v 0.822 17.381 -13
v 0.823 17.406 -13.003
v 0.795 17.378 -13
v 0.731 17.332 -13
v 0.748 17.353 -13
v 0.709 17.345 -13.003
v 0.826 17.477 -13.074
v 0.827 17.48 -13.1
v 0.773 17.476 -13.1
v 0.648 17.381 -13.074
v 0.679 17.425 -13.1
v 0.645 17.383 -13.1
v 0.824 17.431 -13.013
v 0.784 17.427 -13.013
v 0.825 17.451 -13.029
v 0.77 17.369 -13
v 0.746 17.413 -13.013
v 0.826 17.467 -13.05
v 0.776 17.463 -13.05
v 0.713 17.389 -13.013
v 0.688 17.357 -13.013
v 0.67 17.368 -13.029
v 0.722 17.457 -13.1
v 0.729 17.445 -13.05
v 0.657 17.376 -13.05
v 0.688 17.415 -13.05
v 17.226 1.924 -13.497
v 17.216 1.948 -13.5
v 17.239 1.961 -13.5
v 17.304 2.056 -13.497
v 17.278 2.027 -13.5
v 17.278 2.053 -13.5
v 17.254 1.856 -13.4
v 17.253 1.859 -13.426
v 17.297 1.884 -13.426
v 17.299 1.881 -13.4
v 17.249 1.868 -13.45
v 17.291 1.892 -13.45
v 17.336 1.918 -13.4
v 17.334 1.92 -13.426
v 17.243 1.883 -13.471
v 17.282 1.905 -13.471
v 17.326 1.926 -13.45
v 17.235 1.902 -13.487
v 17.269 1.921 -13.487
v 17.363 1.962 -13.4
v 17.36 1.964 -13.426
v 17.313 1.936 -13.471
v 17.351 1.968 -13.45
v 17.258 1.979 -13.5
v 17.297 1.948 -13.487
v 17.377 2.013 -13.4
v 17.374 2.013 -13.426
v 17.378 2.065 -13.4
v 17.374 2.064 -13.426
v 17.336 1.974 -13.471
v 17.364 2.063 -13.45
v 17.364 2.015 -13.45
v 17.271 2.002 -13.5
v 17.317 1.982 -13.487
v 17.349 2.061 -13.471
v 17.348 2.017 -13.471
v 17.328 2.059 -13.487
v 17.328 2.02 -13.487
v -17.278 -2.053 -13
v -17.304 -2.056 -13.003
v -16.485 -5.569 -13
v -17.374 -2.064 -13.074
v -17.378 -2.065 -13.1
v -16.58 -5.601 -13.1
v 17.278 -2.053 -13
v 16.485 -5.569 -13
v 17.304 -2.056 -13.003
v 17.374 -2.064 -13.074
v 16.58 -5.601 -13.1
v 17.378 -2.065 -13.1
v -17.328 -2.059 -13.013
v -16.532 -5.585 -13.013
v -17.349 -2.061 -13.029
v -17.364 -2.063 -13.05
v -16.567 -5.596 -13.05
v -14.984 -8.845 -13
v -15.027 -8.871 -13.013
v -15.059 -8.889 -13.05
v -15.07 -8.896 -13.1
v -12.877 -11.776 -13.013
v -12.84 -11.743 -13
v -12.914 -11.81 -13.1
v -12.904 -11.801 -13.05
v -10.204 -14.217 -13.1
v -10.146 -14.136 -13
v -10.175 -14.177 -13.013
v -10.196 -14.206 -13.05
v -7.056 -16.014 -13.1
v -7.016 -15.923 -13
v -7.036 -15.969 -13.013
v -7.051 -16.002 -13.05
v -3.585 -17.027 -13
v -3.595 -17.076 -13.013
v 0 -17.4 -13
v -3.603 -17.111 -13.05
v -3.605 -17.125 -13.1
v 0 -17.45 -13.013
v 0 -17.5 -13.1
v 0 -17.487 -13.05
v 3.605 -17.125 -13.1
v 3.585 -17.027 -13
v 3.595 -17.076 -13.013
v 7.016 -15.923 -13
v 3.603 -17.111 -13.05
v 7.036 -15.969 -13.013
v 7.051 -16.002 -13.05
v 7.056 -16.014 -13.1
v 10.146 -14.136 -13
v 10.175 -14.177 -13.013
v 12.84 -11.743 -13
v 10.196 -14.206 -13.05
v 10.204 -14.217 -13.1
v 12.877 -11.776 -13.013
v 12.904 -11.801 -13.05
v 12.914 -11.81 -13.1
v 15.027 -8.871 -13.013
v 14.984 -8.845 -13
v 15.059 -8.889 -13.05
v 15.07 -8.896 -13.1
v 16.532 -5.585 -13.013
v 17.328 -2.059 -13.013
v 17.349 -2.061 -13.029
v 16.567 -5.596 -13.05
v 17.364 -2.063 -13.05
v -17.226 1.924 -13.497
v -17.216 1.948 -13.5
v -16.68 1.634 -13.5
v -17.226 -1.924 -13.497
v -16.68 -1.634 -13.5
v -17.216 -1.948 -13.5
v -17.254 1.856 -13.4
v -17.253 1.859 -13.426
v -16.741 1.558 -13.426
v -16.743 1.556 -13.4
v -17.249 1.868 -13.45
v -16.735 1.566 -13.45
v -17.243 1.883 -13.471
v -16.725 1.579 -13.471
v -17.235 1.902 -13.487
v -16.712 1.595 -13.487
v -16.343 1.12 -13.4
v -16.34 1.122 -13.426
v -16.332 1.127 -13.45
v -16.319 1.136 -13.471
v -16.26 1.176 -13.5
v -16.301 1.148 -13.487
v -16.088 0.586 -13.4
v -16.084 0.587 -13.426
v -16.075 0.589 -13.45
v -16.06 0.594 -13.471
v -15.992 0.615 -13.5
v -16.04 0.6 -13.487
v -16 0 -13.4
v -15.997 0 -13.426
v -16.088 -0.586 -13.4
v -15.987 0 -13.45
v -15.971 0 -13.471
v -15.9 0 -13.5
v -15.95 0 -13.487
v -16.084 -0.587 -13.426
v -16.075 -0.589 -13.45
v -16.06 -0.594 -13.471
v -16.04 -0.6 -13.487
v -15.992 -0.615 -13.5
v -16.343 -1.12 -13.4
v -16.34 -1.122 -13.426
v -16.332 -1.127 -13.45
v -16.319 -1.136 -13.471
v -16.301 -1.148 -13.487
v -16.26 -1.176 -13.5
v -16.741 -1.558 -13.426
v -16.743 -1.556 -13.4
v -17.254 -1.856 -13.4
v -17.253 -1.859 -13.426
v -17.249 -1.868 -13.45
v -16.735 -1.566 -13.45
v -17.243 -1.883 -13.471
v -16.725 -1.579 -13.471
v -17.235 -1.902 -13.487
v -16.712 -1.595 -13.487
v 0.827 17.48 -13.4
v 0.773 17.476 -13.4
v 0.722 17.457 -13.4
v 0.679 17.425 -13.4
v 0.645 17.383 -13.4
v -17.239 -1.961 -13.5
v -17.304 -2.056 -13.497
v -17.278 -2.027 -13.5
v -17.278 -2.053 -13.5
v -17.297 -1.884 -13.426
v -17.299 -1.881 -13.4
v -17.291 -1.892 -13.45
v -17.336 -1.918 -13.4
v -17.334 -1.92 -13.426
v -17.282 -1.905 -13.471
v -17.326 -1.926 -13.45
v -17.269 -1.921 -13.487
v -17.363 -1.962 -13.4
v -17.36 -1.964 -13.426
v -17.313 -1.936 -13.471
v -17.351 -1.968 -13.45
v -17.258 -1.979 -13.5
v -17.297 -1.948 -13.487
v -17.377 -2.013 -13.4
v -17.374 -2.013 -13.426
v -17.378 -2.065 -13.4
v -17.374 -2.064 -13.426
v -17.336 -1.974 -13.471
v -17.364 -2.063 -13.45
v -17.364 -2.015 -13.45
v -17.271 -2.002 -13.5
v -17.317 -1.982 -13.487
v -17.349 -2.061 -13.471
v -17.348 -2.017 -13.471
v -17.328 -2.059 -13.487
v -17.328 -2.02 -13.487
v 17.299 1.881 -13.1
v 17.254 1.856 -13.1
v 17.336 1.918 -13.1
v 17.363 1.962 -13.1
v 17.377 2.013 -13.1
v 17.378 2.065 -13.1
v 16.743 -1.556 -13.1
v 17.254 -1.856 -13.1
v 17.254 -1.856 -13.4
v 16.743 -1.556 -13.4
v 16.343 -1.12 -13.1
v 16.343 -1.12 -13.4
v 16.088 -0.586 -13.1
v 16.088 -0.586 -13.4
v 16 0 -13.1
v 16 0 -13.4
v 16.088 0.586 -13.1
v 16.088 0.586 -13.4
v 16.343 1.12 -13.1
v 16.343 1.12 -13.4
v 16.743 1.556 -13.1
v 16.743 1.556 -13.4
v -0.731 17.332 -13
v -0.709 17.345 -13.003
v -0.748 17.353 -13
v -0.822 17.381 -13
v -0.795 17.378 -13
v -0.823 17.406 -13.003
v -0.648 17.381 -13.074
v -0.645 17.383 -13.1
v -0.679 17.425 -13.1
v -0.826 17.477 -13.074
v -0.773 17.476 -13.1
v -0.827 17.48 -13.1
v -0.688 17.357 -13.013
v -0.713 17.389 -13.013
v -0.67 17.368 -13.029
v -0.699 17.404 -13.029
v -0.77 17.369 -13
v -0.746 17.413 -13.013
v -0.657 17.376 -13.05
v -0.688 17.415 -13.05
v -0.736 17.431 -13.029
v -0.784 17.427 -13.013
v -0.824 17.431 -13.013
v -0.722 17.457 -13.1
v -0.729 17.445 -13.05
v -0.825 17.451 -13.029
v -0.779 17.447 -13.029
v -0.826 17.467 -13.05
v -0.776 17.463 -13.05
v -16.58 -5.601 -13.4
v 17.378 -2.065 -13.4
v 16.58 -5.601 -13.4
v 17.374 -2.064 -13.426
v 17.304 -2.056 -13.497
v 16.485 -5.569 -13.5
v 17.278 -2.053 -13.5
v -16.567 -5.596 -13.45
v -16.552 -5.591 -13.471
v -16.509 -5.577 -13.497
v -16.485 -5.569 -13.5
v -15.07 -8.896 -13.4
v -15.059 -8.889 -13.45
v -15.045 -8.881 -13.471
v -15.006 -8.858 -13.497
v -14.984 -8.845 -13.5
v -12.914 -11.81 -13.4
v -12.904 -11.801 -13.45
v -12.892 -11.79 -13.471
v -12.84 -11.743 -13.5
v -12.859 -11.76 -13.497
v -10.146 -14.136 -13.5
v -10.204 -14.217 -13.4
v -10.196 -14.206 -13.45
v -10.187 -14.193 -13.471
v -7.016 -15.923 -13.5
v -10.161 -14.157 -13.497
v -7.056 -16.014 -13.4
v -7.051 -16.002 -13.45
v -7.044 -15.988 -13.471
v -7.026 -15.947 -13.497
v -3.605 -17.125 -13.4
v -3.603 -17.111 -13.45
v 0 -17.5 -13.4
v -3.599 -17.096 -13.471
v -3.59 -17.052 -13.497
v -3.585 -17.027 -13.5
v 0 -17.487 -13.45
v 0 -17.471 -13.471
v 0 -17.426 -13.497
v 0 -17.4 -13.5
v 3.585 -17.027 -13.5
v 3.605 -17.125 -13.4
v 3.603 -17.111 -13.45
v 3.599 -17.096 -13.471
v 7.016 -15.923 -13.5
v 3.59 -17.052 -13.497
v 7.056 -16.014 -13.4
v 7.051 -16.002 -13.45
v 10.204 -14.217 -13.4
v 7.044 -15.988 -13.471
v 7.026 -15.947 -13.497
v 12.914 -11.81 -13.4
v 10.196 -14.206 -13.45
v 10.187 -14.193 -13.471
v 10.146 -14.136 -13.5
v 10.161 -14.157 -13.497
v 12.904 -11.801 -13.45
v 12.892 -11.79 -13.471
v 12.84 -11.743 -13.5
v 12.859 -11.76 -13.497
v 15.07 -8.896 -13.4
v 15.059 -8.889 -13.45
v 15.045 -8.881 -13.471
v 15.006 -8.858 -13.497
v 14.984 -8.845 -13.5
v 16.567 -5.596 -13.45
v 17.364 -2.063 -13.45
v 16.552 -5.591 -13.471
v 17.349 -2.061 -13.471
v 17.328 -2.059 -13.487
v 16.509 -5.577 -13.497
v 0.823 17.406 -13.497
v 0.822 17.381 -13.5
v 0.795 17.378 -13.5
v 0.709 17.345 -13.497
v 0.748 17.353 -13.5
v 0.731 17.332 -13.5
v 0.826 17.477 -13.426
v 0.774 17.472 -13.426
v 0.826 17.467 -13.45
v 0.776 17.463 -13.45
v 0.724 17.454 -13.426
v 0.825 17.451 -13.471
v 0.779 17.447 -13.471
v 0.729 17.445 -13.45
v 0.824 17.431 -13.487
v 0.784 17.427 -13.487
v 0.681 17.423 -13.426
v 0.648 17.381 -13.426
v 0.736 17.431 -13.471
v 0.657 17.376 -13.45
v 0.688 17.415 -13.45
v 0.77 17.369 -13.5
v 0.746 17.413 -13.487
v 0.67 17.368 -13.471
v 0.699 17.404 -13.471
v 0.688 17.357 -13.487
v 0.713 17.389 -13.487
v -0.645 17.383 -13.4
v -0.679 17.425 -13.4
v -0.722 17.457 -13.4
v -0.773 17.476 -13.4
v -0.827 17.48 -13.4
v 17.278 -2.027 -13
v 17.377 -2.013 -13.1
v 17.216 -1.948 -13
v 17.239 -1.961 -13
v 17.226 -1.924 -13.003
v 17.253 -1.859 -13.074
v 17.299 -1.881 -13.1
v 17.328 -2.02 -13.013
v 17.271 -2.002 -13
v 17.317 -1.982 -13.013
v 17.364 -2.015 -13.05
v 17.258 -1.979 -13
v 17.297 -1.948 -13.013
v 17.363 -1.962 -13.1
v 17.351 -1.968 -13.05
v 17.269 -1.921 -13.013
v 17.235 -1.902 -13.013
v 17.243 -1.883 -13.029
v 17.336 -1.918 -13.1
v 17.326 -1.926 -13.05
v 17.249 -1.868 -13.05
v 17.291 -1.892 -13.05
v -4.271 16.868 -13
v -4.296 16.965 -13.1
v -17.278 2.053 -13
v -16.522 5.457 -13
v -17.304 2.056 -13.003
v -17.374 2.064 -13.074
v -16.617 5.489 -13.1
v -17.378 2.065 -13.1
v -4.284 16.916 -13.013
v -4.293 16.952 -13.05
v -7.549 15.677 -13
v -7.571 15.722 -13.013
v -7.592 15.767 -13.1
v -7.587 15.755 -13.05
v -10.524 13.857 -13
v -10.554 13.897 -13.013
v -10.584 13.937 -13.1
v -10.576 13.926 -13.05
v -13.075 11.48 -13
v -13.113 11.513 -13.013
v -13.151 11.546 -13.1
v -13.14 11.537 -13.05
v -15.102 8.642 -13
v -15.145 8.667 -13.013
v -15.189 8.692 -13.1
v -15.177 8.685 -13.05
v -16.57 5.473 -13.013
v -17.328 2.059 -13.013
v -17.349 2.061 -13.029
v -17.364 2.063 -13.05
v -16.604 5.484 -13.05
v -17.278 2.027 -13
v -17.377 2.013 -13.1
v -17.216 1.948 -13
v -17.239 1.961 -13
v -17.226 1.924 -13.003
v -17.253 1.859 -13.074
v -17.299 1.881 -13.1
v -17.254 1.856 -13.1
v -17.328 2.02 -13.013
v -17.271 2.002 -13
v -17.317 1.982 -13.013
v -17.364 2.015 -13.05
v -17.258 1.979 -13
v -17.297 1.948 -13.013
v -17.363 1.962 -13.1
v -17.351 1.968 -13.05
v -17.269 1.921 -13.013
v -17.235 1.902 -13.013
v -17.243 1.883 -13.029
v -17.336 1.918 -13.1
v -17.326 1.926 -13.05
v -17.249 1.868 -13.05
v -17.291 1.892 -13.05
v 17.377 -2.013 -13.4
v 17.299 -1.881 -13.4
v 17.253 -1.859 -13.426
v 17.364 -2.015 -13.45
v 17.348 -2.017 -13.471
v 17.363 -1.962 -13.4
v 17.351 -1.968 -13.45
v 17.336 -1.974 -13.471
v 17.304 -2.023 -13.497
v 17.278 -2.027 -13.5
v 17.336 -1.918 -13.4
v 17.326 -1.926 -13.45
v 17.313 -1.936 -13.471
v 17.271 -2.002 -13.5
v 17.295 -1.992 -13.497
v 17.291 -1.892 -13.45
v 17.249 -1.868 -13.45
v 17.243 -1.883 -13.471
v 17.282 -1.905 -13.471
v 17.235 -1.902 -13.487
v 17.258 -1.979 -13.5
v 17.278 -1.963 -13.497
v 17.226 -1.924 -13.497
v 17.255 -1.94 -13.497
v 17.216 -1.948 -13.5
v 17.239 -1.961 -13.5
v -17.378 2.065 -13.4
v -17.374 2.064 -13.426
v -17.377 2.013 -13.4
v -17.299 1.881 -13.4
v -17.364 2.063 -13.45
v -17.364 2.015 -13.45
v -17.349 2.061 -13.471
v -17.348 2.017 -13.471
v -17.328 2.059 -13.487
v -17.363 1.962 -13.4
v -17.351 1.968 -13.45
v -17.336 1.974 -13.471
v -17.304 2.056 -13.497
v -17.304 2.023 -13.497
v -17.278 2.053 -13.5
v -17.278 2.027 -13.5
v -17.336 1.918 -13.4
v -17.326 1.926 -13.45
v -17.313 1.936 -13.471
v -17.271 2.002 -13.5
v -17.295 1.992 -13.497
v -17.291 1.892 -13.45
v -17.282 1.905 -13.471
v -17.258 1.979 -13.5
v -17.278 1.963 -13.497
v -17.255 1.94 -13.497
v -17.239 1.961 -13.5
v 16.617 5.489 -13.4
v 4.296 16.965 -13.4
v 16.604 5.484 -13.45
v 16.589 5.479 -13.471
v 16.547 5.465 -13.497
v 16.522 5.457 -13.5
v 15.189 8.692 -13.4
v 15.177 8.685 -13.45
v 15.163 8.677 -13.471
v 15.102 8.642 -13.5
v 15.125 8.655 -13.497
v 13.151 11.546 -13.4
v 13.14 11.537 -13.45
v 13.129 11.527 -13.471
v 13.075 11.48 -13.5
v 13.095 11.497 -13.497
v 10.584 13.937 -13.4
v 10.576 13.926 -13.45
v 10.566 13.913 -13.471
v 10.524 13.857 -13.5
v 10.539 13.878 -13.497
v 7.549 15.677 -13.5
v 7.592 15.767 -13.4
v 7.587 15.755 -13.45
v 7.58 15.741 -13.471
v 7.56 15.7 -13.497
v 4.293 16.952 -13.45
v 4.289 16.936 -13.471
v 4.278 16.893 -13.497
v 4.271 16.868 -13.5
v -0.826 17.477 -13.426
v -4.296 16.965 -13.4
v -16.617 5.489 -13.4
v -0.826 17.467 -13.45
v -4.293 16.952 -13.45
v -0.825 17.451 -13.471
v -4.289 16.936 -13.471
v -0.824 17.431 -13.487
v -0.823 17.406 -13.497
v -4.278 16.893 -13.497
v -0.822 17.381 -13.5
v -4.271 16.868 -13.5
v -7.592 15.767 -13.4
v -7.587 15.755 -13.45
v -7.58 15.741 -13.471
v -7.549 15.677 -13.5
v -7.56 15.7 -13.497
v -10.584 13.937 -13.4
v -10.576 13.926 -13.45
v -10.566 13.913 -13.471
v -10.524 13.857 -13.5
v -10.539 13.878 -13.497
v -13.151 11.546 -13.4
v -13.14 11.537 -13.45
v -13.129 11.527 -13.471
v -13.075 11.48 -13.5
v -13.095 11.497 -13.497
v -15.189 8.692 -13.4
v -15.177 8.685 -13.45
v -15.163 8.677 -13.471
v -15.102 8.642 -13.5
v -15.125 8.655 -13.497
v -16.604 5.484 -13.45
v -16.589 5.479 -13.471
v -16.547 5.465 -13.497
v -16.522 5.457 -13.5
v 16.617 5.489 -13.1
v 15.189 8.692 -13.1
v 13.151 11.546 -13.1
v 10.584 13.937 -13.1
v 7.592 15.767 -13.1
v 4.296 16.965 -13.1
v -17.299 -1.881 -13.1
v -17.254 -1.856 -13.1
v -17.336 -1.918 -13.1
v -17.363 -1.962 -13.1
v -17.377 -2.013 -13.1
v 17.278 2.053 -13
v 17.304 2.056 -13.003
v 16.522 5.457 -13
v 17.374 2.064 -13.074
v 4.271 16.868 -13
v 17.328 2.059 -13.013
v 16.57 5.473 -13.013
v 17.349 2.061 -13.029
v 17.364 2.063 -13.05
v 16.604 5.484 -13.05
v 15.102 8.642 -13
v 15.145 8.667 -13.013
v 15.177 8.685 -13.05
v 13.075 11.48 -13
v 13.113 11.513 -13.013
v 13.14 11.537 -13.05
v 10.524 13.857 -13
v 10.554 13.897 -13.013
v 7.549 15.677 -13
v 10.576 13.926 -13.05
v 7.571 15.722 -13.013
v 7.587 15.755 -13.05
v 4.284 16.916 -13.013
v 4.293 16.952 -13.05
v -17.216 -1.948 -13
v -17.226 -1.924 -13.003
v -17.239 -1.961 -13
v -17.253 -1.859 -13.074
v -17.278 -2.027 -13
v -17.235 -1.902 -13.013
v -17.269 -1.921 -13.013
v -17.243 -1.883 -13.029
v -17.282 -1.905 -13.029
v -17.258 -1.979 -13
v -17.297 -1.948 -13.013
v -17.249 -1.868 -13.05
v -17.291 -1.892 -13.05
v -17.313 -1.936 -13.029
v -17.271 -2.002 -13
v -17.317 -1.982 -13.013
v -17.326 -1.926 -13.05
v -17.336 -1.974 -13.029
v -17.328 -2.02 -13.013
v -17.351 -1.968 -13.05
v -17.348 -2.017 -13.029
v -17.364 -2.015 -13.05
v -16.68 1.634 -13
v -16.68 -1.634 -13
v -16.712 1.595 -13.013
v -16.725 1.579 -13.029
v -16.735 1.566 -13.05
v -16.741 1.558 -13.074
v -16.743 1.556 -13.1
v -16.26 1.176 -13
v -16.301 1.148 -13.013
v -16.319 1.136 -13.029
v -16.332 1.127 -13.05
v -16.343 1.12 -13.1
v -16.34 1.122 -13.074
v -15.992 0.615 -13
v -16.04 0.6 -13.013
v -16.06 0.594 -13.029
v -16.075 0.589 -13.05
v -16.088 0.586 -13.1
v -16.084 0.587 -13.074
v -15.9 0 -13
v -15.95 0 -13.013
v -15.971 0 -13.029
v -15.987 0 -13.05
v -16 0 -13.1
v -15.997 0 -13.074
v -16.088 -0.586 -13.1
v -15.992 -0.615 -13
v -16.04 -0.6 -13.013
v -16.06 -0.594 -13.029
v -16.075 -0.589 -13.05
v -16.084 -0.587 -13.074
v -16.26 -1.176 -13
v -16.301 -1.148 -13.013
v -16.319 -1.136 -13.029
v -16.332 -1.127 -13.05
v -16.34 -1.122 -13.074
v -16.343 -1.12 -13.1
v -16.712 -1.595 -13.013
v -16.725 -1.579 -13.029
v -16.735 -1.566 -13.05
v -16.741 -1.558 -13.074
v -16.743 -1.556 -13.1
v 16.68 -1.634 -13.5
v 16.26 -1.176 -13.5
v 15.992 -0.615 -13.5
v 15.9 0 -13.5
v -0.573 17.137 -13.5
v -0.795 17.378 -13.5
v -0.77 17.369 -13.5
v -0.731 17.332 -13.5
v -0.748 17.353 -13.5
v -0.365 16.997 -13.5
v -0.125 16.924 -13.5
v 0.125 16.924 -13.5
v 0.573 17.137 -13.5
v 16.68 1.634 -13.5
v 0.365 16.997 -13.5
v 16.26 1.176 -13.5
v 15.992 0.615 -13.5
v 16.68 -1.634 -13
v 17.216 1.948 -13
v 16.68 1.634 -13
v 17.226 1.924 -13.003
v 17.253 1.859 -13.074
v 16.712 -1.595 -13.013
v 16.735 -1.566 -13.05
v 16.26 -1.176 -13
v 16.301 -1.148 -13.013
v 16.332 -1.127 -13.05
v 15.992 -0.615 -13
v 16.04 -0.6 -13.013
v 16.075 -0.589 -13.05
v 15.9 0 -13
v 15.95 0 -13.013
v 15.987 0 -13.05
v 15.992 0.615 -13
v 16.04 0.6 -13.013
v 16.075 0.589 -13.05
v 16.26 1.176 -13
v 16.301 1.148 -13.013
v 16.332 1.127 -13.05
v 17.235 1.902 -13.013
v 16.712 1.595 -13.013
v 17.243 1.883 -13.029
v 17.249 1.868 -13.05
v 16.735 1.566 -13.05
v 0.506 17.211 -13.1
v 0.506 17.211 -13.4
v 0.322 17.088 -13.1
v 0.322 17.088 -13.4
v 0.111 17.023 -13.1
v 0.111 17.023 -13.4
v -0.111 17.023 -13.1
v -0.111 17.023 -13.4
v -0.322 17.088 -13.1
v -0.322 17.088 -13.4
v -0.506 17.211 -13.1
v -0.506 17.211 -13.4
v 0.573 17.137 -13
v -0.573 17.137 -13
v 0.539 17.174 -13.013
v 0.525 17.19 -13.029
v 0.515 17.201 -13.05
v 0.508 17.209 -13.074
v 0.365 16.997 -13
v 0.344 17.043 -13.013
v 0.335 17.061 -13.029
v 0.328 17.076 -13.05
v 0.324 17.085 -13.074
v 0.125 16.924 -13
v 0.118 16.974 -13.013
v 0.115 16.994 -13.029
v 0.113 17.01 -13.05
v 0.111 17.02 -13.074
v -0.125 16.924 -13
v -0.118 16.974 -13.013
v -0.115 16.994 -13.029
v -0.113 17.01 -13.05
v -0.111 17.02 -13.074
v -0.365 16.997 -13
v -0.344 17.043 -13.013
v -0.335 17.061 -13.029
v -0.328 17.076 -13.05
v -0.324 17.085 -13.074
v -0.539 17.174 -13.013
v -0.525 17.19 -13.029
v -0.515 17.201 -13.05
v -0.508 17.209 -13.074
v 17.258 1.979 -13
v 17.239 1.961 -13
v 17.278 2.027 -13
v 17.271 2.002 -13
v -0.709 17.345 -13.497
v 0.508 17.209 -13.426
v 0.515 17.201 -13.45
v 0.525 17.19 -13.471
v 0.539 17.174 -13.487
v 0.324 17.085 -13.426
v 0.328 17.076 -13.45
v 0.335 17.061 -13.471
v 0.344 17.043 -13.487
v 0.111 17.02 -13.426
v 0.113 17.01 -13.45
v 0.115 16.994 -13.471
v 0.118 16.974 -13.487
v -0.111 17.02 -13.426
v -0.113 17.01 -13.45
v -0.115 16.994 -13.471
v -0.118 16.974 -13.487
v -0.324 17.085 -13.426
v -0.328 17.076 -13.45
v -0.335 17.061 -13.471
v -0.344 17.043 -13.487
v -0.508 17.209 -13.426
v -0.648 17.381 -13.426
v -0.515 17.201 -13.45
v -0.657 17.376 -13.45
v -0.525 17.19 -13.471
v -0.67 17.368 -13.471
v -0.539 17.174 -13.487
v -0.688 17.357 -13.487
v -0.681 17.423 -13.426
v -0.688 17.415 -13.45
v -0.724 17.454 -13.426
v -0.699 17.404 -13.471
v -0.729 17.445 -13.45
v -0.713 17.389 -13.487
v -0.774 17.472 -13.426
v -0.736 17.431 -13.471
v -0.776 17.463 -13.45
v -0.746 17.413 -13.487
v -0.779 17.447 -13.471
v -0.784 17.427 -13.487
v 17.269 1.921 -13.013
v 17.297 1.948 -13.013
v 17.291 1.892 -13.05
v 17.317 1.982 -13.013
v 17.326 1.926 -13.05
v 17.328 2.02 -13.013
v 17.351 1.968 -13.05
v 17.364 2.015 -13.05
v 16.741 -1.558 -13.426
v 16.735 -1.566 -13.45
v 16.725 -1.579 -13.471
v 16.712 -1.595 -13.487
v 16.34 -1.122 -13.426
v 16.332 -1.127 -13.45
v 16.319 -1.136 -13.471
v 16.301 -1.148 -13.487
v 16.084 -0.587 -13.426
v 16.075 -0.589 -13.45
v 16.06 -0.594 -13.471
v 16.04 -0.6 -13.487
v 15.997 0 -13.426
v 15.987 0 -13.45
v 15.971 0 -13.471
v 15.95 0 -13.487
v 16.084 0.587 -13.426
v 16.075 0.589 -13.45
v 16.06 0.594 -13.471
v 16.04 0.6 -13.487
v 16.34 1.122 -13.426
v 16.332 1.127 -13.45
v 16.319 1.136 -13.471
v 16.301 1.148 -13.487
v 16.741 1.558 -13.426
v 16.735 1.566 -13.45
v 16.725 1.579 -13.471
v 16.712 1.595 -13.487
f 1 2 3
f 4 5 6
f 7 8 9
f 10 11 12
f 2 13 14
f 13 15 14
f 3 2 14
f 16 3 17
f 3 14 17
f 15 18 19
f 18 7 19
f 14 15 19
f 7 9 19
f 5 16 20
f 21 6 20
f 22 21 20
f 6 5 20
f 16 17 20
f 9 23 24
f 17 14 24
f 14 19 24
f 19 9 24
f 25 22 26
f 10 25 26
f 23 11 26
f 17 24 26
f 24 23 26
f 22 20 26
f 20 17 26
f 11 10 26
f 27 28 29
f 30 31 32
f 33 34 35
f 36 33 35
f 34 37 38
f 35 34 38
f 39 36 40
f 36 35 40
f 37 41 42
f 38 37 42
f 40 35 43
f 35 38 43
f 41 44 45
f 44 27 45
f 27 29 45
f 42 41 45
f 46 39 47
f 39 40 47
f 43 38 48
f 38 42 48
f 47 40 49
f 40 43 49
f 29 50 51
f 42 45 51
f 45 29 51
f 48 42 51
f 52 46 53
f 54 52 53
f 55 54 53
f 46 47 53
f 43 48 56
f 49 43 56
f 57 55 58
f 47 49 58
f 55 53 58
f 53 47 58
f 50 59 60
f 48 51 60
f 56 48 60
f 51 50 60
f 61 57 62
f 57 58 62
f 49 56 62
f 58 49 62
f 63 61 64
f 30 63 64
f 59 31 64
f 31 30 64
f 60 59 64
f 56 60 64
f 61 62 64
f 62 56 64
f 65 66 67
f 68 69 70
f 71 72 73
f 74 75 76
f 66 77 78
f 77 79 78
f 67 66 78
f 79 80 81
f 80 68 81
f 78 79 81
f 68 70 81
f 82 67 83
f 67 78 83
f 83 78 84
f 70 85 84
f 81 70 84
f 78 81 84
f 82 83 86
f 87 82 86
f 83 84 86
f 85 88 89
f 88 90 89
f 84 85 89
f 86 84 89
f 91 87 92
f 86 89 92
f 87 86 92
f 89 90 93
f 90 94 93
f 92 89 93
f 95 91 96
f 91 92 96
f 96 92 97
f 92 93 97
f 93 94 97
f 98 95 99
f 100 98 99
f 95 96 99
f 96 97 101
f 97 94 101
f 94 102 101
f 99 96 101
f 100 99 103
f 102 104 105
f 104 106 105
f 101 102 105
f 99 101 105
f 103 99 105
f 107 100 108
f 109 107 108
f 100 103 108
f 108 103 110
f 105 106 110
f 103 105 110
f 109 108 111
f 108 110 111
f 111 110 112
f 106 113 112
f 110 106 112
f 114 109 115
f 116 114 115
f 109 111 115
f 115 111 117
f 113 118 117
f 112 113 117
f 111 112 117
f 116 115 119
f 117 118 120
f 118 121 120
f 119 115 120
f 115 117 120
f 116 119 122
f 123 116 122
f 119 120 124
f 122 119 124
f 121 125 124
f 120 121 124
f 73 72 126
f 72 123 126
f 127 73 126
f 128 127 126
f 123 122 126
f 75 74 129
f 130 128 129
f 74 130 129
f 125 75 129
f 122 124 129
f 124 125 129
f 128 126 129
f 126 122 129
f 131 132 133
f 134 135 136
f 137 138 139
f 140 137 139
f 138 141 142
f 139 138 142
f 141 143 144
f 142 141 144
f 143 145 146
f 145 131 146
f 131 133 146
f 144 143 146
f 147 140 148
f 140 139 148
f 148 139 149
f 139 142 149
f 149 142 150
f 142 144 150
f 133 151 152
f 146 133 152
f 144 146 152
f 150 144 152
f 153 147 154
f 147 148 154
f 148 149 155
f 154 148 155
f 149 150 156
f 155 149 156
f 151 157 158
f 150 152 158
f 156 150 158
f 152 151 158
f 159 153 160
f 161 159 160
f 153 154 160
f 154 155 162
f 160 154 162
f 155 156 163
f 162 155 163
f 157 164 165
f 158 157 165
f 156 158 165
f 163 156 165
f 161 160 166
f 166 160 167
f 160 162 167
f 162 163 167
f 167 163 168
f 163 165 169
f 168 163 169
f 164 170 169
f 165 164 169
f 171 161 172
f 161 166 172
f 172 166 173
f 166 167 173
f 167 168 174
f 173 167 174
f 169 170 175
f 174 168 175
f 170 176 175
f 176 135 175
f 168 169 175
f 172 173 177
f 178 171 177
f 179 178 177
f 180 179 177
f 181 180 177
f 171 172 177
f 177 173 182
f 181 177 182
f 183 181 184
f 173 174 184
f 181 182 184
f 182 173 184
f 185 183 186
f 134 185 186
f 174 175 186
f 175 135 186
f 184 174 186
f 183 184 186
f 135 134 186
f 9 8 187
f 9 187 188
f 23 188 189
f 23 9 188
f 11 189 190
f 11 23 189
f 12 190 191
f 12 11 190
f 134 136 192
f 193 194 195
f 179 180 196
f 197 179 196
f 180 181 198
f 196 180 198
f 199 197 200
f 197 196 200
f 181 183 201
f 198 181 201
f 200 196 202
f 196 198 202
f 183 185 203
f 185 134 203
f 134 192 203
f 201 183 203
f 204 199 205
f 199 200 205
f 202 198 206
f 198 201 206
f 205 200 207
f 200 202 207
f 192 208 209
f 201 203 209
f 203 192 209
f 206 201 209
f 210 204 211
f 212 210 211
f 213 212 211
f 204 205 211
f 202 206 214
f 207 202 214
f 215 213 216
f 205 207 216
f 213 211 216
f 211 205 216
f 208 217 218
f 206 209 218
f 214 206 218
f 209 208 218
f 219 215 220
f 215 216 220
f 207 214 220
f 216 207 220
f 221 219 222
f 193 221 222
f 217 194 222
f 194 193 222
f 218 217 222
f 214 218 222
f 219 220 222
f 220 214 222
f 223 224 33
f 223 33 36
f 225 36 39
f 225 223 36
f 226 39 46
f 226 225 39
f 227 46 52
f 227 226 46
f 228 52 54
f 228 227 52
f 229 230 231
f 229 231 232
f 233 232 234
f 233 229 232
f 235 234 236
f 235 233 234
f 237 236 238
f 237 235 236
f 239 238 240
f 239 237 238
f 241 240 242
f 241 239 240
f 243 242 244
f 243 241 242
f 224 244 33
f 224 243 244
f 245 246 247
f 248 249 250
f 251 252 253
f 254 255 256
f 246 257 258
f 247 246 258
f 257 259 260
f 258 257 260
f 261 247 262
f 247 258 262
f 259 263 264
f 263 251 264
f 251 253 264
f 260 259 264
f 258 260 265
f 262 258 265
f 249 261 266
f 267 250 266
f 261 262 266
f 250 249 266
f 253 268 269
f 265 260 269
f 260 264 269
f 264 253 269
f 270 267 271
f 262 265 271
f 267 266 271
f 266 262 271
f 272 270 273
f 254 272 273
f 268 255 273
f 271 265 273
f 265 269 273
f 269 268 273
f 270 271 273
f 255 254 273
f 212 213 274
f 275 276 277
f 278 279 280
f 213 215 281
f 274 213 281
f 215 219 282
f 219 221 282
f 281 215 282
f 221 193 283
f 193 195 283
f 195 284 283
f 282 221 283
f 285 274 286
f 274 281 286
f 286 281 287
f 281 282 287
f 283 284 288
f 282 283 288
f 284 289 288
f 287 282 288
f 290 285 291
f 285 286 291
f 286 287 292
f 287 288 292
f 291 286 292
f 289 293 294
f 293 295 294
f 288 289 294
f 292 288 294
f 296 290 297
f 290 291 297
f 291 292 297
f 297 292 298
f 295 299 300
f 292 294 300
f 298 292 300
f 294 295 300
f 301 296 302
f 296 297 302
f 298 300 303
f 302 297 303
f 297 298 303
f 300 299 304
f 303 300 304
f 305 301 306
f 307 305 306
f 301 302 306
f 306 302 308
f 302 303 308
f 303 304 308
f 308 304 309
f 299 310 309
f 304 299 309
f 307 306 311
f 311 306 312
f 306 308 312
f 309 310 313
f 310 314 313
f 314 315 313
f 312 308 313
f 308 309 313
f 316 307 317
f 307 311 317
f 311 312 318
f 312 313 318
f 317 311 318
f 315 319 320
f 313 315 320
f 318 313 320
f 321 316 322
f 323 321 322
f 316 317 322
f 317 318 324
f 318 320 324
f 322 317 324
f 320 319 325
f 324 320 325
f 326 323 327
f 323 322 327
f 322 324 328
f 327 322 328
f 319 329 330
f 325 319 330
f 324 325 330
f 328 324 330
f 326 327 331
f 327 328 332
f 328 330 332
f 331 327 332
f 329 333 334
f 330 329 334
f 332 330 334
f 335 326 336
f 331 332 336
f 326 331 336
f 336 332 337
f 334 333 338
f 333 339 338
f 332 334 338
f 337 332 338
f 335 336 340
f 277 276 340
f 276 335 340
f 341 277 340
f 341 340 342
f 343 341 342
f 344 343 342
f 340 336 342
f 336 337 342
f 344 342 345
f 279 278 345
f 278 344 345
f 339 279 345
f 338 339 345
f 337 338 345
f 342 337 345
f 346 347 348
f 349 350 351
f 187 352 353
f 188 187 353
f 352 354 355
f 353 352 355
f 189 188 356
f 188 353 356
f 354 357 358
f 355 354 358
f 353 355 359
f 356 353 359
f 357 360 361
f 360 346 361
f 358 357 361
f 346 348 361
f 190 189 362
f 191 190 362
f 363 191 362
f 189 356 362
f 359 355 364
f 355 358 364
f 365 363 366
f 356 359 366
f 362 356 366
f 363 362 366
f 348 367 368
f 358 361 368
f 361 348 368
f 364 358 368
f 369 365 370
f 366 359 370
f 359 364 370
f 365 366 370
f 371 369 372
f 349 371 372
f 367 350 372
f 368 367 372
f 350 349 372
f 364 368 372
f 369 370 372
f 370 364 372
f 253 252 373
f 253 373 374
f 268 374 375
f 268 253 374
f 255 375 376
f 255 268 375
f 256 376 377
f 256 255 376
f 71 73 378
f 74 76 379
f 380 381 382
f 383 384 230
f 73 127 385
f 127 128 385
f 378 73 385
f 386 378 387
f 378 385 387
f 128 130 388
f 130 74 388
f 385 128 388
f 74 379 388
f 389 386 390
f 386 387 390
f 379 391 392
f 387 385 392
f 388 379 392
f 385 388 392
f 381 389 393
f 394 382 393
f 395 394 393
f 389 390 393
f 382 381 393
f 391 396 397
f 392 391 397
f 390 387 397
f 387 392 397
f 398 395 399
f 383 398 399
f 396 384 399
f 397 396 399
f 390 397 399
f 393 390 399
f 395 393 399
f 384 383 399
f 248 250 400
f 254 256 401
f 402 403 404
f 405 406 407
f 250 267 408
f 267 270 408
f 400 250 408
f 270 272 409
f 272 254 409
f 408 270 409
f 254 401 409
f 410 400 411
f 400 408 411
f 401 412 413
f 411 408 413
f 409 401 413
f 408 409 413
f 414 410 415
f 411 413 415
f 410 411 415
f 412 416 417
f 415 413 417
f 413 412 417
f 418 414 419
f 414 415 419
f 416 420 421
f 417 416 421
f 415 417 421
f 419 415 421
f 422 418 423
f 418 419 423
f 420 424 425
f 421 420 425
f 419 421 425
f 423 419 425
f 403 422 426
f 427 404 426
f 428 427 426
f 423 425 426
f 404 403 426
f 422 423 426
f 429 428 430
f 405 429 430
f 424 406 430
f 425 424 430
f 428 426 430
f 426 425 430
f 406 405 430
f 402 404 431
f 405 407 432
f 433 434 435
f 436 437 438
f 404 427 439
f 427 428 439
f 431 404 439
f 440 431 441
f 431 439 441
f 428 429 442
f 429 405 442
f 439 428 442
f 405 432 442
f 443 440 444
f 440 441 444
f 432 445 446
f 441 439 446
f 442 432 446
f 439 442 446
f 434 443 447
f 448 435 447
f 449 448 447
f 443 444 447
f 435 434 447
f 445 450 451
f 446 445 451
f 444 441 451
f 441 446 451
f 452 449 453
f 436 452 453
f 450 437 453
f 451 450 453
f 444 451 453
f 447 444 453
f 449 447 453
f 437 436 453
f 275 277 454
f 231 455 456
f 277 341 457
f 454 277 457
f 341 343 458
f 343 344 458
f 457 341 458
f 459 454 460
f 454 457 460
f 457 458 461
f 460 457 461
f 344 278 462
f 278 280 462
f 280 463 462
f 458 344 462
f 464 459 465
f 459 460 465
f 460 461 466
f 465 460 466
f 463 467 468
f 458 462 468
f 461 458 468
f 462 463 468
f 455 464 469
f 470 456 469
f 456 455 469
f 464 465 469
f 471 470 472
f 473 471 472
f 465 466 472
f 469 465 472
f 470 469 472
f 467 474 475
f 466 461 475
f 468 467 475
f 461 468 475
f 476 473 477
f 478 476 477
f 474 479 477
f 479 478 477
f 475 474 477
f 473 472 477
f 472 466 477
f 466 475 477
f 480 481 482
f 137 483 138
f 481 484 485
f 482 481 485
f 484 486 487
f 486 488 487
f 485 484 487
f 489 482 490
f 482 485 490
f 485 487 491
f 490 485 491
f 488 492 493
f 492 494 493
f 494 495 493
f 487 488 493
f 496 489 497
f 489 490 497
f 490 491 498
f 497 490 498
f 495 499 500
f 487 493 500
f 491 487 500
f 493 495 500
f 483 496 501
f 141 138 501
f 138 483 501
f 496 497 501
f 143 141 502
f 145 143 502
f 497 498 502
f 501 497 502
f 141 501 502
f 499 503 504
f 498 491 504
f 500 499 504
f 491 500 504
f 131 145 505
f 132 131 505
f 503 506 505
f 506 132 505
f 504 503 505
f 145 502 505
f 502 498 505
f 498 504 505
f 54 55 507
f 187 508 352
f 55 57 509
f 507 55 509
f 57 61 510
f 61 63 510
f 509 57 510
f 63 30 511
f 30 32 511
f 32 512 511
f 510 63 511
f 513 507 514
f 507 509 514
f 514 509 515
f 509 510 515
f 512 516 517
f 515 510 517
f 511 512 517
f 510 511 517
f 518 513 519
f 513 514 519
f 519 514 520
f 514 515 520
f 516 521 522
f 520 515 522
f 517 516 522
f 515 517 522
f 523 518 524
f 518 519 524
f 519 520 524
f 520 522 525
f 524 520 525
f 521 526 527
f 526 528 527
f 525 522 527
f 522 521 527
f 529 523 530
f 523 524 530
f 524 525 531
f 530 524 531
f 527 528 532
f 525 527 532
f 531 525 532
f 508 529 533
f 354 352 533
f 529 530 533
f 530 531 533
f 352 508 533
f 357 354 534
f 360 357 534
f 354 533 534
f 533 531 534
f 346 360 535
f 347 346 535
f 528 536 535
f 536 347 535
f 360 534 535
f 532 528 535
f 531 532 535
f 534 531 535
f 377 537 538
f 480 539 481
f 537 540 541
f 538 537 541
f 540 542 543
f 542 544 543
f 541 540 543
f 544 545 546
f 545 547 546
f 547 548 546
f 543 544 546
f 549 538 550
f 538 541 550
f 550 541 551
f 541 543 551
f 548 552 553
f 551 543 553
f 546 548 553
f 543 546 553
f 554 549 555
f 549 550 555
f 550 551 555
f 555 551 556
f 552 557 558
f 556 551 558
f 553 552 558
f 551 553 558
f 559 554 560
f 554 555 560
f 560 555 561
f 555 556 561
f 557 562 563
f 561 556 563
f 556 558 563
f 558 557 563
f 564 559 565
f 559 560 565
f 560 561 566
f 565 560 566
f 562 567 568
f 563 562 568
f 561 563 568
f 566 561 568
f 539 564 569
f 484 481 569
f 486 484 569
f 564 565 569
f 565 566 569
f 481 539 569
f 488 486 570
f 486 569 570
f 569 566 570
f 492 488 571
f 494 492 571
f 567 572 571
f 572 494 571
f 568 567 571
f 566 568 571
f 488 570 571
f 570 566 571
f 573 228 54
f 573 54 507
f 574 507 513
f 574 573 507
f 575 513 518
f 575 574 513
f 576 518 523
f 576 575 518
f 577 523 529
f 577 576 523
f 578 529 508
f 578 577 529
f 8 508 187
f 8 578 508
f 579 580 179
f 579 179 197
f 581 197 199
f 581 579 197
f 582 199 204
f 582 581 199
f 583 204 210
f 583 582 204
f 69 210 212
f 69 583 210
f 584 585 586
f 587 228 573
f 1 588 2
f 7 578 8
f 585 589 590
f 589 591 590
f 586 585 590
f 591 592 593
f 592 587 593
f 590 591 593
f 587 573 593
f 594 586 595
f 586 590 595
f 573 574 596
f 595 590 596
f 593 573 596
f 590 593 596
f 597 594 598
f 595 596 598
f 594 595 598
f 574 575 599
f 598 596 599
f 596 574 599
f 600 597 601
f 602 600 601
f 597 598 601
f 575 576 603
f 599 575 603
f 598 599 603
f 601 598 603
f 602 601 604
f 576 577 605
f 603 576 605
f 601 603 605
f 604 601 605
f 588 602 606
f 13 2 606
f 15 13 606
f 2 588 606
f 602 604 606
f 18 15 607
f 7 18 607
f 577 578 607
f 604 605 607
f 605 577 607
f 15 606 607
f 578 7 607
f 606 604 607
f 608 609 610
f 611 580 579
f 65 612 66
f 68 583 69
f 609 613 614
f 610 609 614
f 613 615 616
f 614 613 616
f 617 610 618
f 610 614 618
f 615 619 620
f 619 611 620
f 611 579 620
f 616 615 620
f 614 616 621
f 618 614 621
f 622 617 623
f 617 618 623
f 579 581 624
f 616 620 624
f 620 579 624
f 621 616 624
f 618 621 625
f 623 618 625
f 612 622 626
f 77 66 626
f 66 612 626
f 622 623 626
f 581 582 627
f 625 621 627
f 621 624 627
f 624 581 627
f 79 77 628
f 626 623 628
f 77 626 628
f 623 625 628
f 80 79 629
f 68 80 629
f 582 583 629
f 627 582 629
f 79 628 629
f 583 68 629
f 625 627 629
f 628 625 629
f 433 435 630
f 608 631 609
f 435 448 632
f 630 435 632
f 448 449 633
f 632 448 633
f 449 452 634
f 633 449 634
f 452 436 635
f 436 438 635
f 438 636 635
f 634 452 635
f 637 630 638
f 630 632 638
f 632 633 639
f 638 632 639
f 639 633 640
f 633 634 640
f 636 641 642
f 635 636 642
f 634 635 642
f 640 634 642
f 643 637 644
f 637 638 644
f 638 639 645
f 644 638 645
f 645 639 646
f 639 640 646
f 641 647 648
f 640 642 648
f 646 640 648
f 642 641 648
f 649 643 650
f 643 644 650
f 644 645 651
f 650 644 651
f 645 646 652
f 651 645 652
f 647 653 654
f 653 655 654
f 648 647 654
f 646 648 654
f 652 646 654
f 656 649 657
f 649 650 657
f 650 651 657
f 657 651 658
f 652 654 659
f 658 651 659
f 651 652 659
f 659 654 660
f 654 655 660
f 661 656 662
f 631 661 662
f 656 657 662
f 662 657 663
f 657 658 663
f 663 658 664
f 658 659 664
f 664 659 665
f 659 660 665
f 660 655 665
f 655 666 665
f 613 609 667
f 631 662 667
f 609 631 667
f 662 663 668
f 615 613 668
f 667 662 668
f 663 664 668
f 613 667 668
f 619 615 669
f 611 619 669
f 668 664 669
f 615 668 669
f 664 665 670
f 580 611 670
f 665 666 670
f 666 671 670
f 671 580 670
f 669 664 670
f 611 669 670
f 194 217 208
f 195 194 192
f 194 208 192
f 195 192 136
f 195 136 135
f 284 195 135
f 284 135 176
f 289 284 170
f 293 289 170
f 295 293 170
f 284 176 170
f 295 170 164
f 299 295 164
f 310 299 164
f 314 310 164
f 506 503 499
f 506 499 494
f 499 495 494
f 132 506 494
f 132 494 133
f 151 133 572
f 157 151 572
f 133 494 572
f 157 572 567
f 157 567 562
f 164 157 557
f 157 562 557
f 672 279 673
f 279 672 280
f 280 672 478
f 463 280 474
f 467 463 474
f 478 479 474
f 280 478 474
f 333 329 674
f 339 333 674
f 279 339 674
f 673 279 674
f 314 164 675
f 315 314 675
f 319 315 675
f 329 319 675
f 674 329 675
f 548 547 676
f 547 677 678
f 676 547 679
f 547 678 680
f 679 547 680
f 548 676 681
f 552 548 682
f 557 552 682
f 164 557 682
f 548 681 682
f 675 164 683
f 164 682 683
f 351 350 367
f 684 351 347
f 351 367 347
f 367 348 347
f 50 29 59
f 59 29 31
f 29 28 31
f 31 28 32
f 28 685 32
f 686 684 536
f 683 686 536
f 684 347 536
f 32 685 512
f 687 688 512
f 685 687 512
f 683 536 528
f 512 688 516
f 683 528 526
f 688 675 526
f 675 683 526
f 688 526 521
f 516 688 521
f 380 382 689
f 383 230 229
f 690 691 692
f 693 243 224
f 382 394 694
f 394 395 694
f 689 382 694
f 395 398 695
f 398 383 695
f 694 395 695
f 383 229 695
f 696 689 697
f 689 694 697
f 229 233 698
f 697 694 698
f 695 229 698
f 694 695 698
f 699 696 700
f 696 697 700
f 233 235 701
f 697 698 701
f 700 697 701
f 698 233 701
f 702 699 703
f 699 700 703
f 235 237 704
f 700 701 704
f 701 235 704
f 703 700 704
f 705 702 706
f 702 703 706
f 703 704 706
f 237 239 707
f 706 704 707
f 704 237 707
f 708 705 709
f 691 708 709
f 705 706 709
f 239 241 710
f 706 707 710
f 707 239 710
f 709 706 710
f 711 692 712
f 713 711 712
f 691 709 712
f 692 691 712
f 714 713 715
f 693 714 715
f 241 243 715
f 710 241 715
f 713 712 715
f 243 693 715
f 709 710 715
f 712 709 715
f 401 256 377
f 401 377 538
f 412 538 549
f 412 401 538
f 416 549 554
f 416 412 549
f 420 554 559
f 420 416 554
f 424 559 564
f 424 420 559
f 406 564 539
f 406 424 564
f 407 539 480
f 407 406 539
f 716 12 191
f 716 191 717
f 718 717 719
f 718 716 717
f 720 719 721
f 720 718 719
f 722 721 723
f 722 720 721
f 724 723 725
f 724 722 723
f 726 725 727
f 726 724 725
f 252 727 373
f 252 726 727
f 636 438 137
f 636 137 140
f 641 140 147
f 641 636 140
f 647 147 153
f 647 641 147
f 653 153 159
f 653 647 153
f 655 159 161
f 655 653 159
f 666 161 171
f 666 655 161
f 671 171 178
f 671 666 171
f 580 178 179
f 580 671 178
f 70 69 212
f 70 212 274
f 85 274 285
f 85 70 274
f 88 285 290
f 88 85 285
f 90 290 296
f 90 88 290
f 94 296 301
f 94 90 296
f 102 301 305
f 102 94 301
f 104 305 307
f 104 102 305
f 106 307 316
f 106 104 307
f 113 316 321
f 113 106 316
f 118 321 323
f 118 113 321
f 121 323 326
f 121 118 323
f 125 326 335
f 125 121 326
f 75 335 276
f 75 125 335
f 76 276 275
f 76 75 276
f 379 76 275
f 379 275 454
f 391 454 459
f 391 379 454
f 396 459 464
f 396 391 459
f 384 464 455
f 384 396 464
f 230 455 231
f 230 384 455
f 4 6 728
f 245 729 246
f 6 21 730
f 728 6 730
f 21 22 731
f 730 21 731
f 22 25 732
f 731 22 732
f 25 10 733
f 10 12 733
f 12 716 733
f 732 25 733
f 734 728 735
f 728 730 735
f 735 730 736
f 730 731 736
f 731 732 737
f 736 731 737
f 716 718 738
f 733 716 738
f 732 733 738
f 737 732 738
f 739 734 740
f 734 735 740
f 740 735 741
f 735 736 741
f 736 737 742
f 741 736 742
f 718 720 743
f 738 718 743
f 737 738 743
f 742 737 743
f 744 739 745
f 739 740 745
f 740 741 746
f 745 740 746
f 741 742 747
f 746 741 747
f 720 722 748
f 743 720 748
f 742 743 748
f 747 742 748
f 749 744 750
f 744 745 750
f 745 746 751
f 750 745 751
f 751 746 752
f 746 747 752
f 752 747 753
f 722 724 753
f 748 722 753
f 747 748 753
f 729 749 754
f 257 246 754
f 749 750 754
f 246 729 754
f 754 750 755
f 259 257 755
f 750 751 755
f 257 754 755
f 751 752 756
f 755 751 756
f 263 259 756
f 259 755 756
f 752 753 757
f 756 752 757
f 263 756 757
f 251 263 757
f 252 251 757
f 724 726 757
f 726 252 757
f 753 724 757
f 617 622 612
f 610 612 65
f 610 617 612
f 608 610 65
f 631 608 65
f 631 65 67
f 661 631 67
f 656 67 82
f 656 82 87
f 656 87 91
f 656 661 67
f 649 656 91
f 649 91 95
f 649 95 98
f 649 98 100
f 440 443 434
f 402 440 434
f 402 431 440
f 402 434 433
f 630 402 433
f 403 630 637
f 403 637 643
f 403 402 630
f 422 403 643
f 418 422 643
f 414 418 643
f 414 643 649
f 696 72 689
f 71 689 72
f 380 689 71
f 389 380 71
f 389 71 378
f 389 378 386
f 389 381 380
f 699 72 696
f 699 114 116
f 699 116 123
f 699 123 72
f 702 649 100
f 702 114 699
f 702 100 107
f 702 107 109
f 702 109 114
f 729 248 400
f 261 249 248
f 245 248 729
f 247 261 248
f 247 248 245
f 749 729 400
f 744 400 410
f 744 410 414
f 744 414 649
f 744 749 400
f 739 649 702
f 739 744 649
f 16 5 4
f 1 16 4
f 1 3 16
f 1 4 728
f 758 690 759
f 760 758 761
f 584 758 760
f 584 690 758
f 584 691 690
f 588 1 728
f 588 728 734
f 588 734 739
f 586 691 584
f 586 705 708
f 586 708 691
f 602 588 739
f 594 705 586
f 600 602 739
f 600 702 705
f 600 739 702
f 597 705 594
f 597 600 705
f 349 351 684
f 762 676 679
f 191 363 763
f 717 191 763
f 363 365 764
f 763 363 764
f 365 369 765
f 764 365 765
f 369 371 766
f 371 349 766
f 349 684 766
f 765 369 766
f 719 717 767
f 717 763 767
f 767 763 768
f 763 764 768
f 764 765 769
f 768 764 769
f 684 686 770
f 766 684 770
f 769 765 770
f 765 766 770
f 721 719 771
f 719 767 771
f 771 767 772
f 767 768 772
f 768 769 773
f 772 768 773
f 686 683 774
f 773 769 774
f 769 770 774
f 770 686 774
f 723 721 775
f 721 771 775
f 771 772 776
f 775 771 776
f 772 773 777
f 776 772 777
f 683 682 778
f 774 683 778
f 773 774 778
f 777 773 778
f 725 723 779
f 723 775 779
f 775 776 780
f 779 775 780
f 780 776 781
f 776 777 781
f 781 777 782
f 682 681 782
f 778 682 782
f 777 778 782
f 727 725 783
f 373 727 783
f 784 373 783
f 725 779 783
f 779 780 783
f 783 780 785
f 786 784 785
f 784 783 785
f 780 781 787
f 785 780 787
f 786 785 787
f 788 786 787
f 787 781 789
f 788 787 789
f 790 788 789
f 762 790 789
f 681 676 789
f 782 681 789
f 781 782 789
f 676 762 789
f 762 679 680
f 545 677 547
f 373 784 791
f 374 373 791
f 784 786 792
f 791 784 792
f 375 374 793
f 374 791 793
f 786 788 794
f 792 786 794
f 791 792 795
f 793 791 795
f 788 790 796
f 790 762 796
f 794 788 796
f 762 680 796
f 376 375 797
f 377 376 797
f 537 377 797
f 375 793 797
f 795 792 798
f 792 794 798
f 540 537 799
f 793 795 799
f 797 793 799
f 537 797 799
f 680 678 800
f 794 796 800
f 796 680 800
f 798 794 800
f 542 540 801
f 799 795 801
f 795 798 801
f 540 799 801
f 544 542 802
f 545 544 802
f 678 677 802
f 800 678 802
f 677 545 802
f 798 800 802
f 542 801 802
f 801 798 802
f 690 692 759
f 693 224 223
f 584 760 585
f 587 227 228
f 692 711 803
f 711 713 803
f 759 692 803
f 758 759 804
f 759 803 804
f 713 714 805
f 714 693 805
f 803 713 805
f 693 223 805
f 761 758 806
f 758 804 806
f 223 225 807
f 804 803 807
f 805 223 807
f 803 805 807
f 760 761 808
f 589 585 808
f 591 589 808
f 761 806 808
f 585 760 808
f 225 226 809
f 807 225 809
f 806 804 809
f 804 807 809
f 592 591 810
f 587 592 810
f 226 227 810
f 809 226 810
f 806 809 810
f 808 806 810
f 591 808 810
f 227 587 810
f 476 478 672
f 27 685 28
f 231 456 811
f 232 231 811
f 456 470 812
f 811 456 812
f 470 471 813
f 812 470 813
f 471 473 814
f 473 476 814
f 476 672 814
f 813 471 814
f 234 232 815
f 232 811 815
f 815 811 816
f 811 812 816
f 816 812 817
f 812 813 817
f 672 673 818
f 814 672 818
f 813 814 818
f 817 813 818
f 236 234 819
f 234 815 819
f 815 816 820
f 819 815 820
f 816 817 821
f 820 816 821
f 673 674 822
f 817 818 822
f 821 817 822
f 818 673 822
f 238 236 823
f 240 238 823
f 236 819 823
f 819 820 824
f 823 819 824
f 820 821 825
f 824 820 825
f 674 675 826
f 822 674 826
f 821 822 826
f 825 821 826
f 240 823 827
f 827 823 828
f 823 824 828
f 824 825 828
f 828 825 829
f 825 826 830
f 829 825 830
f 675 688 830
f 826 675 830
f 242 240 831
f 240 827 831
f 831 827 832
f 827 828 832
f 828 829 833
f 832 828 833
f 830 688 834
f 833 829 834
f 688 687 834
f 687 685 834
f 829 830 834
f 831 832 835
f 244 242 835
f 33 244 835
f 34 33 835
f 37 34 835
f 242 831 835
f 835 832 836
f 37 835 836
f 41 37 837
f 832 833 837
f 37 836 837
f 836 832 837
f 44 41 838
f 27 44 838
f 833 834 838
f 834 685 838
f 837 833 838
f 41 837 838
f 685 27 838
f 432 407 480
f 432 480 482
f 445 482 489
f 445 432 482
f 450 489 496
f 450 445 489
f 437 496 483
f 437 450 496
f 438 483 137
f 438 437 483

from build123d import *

# Parameters (mm, degrees)
BOSS_EXTRUDE1_DEPTH = 0.5
FILLET1_R           = 0.1
FILLET2_R           = 0.1


with BuildPart() as part:
    # Sketch1 → Boss-Extrude1 (new body)
    with BuildSketch(Plane.XY.offset(-13)):
        with BuildLine():
            ThreePointArc((0.826653793, 17.480464625), (0.722337253, 17.456755657), (0.645162885, 17.382673455))
            ThreePointArc((0.645162885, 17.382673455), (0, 17.015119335), (-0.645162885, 17.382673455))
            ThreePointArc((-0.645162885, 17.382673455), (-0.722337253, 17.456755657), (-0.826653793, 17.480464625))
            ThreePointArc((-0.826653793, 17.480464625), (-11.92734093, 12.805800964), (-17.37776975, 2.064732073))
            ThreePointArc((-17.37776975, 2.064732073), (-17.351211134, 1.939151306), (-17.253787879, 1.855577395))
            ThreePointArc((-17.253787879, 1.855577395), (-16, 0), (-17.253787879, -1.855577395))
            ThreePointArc((-17.253787879, -1.855577395), (-17.351211134, -1.939151306), (-17.37776975, -2.064732073))
            ThreePointArc((-17.37776975, -2.064732073), (0, -17.5), (17.37776975, -2.064732073))
            ThreePointArc((17.37776975, -2.064732073), (17.351211134, -1.939151306), (17.253787879, -1.855577395))
            ThreePointArc((17.253787879, -1.855577395), (16, 0), (17.253787879, 1.855577395))
            ThreePointArc((17.253787879, 1.855577395), (17.351211134, 1.939151306), (17.37776975, 2.064732073))
            ThreePointArc((17.37776975, 2.064732073), (11.92734093, 12.805800964), (0.826653793, 17.480464625))
        make_face()
    extrude(amount=-BOSS_EXTRUDE1_DEPTH)

    # Fillet1
    fillet1_edges = [part.edges().sort_by_distance(p)[0] for p in [
        (0, 17.015119335, -13.5),
        (-0.722337253, 17.456755657, -13.5),
        (-11.92734093, 12.805800964, -13.5),
        (-17.351211134, 1.939151306, -13.5),
        (-16, 0, -13.5),
        (-17.351211134, -1.939151306, -13.5),
        (0, -17.5, -13.5),
        (17.351211134, -1.939151306, -13.5),
        (16, 0, -13.5),
        (17.351211134, 1.939151306, -13.5),
        (11.92734093, 12.805800964, -13.5),
        (0.722337253, 17.456755657, -13.5),
    ]]
    fillet(fillet1_edges, radius=FILLET1_R)

    # Fillet2
    fillet2_edges = [part.edges().sort_by_distance(p)[0] for p in [
        (17.351211134, 1.939151306, -13),
        (16, 0, -13),
        (17.351211134, -1.939151306, -13),
        (0, -17.5, -13),
        (-17.351211134, -1.939151306, -13),
        (-16, 0, -13),
        (-17.351211134, 1.939151306, -13),
        (-11.92734093, 12.805800964, -13),
        (-0.722337253, 17.456755657, -13),
        (0, 17.015119335, -13),
        (0.722337253, 17.456755657, -13),
        (11.92734093, 12.805800964, -13),
    ]]
    fillet(fillet2_edges, radius=FILLET2_R)


solid = part.part
